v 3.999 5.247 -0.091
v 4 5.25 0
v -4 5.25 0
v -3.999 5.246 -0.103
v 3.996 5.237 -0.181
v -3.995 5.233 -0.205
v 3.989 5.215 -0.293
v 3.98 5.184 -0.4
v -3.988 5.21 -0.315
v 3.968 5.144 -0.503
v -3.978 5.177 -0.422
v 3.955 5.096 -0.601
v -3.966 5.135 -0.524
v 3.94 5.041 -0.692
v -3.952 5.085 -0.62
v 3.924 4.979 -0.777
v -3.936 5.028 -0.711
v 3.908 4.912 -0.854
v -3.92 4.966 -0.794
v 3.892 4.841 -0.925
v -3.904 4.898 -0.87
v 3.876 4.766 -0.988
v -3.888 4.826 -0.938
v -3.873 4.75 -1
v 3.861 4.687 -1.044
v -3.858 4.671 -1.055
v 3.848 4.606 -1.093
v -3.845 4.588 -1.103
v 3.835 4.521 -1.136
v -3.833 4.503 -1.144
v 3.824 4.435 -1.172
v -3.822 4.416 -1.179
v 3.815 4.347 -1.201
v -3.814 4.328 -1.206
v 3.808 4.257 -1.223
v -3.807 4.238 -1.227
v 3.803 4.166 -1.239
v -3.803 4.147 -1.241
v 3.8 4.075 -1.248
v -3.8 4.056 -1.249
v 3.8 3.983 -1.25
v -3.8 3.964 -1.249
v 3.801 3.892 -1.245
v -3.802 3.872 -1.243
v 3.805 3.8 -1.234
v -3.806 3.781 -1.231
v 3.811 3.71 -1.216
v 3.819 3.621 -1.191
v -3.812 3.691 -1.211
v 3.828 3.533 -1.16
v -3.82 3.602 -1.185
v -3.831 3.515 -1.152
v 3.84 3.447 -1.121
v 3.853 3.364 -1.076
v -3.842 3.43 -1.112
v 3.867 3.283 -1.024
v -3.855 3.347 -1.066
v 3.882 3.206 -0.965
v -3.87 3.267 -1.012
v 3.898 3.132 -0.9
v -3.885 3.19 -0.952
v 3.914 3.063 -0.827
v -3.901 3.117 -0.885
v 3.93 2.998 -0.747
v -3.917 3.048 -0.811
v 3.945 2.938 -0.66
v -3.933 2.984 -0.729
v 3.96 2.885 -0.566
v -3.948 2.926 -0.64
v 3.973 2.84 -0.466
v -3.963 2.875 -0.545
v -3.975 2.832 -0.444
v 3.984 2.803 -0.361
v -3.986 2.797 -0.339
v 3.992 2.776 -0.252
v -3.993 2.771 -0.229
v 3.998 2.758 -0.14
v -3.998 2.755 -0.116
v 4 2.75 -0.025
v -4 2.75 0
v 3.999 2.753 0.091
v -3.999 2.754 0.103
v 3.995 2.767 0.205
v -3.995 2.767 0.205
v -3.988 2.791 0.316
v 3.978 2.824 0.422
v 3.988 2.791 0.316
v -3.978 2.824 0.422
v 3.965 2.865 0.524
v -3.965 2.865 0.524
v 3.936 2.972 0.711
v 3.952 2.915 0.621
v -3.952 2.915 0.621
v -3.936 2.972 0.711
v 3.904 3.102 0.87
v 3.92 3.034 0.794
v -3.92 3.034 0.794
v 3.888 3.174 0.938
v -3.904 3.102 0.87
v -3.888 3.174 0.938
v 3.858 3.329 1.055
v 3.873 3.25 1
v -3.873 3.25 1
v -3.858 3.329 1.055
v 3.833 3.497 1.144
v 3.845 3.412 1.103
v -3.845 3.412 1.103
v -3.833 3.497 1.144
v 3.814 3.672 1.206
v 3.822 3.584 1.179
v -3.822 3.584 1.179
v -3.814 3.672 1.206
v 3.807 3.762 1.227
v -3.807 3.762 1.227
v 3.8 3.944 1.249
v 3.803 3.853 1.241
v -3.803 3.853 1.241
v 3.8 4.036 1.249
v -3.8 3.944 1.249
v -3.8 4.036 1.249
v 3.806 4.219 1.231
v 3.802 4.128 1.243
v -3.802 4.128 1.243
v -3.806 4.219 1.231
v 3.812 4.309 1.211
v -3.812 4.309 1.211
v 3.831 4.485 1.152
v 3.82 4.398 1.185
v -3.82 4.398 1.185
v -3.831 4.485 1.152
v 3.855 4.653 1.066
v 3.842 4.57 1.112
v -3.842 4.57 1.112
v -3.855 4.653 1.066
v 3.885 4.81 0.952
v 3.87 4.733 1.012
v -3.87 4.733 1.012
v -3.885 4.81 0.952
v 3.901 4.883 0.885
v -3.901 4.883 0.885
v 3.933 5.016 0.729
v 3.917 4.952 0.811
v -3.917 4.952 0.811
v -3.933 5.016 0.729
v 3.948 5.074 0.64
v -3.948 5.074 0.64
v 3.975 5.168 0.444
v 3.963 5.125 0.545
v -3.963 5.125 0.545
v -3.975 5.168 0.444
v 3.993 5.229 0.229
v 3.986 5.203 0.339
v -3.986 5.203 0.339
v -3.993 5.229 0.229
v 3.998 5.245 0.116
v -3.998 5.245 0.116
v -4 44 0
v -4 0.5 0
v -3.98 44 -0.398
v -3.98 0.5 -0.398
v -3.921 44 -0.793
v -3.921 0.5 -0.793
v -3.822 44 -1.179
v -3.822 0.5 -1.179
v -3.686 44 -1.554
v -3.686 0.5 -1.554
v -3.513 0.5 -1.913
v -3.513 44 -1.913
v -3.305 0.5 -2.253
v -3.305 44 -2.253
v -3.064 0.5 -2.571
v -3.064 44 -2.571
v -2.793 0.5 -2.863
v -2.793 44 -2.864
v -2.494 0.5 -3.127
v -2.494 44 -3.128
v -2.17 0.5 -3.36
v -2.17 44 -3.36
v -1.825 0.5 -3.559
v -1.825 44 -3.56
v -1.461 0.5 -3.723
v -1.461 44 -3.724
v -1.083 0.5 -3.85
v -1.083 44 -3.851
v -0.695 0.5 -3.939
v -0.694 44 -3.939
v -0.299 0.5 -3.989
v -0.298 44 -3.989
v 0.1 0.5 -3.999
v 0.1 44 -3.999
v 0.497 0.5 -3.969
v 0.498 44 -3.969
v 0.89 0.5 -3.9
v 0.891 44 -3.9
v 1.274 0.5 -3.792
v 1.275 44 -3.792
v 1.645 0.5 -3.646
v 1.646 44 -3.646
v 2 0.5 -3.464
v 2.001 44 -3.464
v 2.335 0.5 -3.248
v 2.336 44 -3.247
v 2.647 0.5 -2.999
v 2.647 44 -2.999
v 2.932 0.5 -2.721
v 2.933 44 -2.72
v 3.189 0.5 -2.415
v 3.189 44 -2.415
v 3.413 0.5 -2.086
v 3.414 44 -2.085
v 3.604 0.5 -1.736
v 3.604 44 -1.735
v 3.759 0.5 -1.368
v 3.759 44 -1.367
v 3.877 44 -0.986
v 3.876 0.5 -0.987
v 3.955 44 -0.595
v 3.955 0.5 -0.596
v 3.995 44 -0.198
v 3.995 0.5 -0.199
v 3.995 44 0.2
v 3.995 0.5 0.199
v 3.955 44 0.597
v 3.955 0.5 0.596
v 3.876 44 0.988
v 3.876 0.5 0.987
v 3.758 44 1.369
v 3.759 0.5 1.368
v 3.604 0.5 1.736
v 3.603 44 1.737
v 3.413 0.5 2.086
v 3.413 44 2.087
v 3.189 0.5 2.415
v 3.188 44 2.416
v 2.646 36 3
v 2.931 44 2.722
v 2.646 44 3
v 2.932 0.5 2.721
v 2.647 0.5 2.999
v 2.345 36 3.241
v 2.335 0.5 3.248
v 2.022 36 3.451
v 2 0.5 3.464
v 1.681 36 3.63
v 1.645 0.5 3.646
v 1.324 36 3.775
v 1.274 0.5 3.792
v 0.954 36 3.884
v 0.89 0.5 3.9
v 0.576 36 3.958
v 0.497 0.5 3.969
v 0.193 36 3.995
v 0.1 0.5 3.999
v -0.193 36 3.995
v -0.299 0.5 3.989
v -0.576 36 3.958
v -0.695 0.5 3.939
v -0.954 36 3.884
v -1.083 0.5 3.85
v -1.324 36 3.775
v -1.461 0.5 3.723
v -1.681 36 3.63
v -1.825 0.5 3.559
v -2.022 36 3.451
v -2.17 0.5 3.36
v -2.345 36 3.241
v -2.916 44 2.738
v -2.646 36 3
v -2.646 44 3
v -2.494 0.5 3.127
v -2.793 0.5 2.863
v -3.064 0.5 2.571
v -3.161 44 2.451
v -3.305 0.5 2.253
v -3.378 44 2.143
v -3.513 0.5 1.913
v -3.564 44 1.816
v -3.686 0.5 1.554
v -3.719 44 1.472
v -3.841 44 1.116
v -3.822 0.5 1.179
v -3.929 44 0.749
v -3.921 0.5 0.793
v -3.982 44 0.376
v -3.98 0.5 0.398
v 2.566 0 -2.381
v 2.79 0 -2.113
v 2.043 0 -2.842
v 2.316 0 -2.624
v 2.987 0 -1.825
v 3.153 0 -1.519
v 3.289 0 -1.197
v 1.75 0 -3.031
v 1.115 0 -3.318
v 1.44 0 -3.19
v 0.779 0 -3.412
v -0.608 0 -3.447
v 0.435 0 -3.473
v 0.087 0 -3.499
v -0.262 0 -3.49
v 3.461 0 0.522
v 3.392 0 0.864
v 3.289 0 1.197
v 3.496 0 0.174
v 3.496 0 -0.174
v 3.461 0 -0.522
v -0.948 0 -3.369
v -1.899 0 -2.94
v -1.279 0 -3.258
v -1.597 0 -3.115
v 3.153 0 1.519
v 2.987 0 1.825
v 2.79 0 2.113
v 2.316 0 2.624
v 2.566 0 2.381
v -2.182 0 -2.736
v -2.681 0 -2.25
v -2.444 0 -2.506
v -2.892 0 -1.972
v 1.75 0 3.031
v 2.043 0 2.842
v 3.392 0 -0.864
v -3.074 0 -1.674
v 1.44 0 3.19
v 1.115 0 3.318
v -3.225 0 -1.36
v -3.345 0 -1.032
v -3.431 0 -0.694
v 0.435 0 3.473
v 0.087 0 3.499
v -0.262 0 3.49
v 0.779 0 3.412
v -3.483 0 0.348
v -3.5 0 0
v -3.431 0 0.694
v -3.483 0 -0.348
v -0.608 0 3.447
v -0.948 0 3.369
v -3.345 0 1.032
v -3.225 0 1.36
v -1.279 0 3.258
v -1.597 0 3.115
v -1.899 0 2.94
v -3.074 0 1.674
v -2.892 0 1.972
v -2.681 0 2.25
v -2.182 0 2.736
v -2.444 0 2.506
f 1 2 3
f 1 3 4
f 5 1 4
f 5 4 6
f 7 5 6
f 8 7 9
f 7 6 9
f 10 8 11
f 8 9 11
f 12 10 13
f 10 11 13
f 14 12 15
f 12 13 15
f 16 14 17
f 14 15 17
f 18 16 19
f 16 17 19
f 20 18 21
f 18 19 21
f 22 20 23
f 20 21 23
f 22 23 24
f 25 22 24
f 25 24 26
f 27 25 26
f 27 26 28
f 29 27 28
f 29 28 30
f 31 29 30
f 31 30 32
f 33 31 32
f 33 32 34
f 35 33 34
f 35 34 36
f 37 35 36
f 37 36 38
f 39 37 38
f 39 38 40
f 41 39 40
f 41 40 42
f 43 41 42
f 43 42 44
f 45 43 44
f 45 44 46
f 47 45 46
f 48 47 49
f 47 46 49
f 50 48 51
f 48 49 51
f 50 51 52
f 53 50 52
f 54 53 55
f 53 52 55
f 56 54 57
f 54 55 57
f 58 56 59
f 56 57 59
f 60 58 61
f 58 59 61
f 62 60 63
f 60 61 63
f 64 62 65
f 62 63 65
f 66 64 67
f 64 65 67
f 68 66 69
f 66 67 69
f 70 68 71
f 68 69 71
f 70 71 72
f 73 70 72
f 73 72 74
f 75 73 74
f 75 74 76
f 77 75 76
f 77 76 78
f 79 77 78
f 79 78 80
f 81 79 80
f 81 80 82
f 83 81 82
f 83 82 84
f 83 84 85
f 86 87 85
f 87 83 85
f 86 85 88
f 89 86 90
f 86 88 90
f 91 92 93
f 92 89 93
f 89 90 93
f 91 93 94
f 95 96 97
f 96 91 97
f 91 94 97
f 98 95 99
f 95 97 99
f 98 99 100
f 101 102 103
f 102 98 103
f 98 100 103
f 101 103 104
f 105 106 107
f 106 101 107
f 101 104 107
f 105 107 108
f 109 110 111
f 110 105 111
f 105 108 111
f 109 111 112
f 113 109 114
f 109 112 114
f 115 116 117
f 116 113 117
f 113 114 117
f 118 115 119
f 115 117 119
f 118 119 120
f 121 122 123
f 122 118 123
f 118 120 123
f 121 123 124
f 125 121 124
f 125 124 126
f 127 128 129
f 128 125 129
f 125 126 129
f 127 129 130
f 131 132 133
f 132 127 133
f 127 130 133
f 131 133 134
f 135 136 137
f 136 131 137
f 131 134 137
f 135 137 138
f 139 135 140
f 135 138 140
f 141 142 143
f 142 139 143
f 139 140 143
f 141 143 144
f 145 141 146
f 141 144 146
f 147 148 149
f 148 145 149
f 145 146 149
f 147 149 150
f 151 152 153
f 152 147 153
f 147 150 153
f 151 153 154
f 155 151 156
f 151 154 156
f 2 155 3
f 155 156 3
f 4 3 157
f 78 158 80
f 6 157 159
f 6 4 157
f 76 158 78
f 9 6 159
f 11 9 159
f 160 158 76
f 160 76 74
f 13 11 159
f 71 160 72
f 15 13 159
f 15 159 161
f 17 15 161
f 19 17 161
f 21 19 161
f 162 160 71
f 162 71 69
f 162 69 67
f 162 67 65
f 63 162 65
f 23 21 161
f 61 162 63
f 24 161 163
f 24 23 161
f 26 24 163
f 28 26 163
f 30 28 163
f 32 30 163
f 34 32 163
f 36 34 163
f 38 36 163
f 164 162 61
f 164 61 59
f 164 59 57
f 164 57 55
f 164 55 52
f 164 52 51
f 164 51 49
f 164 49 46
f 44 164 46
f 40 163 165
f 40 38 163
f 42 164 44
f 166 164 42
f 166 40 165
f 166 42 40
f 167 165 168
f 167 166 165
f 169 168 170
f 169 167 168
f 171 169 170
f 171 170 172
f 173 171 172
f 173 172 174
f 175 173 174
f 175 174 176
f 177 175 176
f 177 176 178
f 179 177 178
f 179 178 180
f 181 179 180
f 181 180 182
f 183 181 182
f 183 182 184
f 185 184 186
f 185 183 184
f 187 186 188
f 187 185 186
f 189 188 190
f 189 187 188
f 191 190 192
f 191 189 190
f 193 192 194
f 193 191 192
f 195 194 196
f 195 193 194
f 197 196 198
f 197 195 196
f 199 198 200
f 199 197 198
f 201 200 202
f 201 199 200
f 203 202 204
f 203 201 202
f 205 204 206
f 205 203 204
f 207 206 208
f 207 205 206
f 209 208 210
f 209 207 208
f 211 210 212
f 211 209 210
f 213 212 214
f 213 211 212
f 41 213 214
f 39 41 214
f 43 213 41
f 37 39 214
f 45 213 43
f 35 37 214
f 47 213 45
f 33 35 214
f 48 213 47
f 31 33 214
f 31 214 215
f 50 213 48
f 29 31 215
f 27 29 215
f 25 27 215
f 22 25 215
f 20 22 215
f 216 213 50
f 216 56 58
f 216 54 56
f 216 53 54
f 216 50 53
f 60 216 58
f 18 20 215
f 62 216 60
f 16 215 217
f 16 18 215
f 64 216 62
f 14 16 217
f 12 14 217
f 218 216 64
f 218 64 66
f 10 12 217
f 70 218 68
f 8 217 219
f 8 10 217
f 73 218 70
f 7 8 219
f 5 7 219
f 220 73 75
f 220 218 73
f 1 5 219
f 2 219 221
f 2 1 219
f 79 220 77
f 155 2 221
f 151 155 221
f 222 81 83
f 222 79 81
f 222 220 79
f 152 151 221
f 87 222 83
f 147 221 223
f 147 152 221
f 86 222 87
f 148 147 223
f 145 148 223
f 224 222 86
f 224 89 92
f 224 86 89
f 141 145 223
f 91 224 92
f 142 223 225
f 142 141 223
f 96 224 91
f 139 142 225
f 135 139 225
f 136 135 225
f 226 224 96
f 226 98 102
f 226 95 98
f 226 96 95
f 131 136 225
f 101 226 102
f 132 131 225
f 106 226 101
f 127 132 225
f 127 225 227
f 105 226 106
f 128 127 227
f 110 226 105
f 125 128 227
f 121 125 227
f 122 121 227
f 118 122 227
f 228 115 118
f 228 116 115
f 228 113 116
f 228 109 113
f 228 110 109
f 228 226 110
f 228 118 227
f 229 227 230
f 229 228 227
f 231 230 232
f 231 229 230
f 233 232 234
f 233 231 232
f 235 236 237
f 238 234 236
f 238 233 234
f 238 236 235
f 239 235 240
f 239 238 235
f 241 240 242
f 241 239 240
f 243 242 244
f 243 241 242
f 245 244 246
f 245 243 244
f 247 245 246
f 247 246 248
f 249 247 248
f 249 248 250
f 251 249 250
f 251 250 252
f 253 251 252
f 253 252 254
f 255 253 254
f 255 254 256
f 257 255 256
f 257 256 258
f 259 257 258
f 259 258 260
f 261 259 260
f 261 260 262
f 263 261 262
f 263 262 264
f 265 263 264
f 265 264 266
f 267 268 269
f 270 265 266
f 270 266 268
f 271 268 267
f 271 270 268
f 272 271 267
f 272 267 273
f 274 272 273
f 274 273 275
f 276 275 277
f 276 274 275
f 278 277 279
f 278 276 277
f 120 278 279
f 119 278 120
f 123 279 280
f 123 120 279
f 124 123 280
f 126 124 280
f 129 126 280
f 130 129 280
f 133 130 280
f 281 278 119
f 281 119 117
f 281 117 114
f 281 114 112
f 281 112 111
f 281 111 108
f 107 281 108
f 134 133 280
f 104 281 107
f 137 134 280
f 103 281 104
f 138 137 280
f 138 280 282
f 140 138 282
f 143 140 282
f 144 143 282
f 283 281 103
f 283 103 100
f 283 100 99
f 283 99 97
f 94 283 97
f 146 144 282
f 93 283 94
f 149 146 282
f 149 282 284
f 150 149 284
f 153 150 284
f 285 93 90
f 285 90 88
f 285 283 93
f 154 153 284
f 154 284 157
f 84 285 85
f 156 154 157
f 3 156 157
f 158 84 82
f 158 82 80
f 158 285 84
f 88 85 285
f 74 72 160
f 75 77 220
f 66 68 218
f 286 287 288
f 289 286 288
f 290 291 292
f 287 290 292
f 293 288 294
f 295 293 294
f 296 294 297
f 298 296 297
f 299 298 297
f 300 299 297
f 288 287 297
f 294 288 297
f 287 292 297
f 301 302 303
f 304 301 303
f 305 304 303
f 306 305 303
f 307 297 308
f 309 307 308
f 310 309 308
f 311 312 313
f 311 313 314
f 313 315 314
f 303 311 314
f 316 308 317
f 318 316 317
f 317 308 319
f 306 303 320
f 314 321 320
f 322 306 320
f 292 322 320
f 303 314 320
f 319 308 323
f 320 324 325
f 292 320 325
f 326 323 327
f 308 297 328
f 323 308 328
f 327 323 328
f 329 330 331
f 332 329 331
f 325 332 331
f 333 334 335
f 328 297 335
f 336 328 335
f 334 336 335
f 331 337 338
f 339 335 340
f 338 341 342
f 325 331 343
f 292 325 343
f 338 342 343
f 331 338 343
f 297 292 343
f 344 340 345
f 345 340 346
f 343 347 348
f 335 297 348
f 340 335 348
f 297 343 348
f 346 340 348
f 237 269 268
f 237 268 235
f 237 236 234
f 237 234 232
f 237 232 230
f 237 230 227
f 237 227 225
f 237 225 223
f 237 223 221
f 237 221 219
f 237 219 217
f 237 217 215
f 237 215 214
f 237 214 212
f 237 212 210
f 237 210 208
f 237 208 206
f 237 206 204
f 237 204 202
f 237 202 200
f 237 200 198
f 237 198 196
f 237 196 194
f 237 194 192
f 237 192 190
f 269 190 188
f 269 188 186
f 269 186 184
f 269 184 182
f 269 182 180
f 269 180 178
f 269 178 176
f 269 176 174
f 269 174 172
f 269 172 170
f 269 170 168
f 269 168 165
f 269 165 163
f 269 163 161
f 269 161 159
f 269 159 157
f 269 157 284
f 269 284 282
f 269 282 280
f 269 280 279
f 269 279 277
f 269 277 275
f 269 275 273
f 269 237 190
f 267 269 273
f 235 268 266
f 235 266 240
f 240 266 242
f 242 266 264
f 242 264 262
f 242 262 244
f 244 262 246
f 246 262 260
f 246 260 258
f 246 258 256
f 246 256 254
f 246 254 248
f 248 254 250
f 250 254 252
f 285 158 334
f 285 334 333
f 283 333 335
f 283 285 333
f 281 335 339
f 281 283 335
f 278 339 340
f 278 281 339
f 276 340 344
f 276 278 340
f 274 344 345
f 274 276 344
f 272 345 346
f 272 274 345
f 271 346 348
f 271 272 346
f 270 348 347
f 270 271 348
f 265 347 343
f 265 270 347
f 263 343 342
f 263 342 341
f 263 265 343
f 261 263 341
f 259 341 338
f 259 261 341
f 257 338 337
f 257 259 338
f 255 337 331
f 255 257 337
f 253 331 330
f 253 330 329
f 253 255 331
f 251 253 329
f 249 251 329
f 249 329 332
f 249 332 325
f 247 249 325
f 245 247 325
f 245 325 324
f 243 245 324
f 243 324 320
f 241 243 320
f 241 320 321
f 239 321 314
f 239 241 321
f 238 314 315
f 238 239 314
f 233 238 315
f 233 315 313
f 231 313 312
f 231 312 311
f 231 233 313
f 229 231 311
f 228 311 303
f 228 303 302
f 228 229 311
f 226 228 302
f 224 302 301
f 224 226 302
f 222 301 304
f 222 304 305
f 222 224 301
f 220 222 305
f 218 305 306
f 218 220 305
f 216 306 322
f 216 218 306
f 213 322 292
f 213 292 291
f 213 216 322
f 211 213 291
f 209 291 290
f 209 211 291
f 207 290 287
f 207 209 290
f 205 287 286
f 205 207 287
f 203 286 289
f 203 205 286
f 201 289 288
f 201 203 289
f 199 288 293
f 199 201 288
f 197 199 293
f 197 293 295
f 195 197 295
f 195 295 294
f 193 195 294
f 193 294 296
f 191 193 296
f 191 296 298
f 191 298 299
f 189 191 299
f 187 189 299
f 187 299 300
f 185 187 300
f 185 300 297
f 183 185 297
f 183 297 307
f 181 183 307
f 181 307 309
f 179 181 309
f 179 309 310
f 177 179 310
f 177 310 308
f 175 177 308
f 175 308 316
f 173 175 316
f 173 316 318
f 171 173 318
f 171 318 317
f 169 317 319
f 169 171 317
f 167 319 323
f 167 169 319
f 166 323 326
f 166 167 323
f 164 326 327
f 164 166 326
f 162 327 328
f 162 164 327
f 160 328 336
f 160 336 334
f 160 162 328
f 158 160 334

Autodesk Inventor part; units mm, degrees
ref_plane "XZ Plane" through (0, 0, 0) normal (0, 1, 0) x (-1, 0, 0)
ref_plane "XY Plane" through (0, 0, 0) normal (0, 0, 1) x (1, 0, 0)
sketch "Sketch2" plane through (0, 0, 0) normal (0, 1, 0) x (-1, 0, 0)
  circle A0 centre (0, 0) radius 4
  dimension "d9" = 8
extrude "Extrusion1" add sketch "Sketch2" along normal blind 44
chamfer "Chamfer1" distance 0.5 angle 45 1 edges at (4, 0, 0)
sketch "Sketch3" plane through (0, 44, 0) normal (0, 1, 0) x (1, 0, 0)
  line L0 (0, 0) -> (0, -3) construction
  line L1 (0, -3) -> (-4, -3)
  line L2 (0, -3) -> (4, -3)
  line L3 (4, -3) -> (4, -6)
  line L4 (4, -6) -> (-4, -6)
  line L5 (-4, -6) -> (-4, -3)
  dimension "d15" = 3
  dimension "d16" = 4
  dimension "d17" = 4
  dimension "d18" = 3
extrude "Extrusion2" cut sketch "Sketch3" against normal blind 8
ref_plane "Work Plane1" through (-4, 0, 0) normal (1, 0, 0) x (0, 1, 0)
sketch "Sketch4" plane through (-4, 0, 0) normal (1, 0, 0) x (0, 1, 0)
  line L0 (0.5, 4) -> (0.5, -4) construction
  line L1 (0.5, 0) -> (4, 0) construction
  circle A0 centre (4, 0) radius 1.25
  point P0 (0, 0)
  dimension "d23" = 2.5
  dimension "d24" = 3.5
extrude "Extrusion3" cut sketch "Sketch4" along normal through all
properties part number "reverse gear crankshaft outer rod"
